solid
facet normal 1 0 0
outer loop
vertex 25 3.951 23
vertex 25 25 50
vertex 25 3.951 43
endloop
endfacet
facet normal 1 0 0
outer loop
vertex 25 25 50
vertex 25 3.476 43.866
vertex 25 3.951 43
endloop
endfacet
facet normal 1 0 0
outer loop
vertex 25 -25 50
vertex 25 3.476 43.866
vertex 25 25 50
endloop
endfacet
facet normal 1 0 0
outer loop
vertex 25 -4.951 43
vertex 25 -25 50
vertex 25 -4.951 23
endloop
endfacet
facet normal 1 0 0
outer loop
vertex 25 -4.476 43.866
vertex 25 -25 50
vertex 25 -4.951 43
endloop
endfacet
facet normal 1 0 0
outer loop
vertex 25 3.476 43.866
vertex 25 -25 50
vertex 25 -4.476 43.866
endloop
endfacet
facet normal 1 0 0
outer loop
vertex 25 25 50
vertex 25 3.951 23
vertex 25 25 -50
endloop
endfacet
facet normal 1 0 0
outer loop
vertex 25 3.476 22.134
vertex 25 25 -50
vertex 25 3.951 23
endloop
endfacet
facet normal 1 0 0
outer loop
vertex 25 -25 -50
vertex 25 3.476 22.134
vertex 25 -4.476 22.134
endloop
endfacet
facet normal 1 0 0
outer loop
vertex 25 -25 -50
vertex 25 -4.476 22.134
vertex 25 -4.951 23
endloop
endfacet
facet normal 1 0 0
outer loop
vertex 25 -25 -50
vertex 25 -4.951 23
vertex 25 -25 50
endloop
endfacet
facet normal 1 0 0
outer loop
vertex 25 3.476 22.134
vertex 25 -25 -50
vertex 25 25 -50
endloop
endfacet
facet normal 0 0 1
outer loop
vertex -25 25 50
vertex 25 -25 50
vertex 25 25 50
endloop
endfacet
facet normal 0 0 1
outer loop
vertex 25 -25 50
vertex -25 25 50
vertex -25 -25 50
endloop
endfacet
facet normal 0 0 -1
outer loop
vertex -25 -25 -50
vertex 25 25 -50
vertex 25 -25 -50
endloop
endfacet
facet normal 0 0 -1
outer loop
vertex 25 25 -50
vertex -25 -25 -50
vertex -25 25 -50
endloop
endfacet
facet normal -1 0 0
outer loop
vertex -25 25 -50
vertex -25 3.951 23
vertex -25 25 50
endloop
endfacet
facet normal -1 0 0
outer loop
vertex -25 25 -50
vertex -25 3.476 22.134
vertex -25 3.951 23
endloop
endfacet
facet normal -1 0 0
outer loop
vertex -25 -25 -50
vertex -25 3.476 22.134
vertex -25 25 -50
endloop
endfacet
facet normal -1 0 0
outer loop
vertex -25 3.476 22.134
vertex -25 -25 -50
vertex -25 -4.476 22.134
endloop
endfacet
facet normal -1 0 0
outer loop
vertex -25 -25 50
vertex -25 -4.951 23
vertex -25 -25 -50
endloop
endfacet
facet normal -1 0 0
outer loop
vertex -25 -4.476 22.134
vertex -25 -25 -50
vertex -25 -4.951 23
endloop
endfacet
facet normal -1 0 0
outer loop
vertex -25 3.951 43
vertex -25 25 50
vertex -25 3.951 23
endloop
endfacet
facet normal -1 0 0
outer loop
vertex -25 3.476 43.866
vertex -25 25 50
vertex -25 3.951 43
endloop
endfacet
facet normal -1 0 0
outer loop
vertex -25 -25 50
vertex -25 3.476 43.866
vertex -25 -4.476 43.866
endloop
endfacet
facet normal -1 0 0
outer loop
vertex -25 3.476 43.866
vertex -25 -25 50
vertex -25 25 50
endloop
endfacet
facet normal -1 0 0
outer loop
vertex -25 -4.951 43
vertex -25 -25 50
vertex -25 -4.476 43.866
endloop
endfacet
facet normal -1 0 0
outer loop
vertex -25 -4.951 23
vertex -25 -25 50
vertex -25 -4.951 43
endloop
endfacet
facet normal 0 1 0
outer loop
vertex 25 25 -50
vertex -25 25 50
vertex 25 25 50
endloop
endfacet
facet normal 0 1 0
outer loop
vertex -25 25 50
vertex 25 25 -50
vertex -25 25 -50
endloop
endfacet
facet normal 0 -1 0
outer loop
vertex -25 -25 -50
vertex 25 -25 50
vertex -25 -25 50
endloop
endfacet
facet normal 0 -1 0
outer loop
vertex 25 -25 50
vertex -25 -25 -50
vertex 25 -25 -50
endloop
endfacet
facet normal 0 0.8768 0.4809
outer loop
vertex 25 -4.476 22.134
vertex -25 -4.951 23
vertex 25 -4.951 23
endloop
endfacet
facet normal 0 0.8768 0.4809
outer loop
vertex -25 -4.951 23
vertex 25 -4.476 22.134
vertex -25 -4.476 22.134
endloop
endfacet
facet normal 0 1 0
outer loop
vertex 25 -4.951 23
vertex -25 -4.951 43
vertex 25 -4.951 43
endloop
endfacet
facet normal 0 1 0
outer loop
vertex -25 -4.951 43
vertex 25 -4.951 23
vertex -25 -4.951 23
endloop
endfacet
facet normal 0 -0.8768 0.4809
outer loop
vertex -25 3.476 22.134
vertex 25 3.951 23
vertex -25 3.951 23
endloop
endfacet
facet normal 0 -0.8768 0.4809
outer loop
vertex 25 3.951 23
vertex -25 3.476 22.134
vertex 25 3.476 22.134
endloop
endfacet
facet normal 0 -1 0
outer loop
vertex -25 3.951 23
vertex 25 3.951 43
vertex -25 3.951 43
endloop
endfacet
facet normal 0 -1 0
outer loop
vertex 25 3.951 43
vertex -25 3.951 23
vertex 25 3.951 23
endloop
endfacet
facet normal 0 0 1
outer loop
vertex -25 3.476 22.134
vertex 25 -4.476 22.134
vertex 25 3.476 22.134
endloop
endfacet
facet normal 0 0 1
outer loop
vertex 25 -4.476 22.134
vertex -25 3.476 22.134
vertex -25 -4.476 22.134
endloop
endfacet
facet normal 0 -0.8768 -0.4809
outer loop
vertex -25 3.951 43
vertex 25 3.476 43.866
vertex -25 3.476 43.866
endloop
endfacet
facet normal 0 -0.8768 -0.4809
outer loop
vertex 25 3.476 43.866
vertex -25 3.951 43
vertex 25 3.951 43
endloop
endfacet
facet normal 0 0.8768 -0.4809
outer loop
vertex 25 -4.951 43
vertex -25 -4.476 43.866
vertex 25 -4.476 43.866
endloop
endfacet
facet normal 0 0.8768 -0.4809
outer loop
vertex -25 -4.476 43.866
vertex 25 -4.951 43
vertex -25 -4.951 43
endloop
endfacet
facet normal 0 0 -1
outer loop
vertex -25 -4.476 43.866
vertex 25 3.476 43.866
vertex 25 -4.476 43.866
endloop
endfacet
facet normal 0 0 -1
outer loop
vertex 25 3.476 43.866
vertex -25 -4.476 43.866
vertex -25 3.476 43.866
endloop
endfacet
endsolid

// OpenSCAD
difference(){    
    cube([50,50,100], center = true);
    minkowski(){
        rotate([90,0,0])
        translate([-43.48,23,-3])
        cube([125,20,7]);
        sphere(1);
}}
